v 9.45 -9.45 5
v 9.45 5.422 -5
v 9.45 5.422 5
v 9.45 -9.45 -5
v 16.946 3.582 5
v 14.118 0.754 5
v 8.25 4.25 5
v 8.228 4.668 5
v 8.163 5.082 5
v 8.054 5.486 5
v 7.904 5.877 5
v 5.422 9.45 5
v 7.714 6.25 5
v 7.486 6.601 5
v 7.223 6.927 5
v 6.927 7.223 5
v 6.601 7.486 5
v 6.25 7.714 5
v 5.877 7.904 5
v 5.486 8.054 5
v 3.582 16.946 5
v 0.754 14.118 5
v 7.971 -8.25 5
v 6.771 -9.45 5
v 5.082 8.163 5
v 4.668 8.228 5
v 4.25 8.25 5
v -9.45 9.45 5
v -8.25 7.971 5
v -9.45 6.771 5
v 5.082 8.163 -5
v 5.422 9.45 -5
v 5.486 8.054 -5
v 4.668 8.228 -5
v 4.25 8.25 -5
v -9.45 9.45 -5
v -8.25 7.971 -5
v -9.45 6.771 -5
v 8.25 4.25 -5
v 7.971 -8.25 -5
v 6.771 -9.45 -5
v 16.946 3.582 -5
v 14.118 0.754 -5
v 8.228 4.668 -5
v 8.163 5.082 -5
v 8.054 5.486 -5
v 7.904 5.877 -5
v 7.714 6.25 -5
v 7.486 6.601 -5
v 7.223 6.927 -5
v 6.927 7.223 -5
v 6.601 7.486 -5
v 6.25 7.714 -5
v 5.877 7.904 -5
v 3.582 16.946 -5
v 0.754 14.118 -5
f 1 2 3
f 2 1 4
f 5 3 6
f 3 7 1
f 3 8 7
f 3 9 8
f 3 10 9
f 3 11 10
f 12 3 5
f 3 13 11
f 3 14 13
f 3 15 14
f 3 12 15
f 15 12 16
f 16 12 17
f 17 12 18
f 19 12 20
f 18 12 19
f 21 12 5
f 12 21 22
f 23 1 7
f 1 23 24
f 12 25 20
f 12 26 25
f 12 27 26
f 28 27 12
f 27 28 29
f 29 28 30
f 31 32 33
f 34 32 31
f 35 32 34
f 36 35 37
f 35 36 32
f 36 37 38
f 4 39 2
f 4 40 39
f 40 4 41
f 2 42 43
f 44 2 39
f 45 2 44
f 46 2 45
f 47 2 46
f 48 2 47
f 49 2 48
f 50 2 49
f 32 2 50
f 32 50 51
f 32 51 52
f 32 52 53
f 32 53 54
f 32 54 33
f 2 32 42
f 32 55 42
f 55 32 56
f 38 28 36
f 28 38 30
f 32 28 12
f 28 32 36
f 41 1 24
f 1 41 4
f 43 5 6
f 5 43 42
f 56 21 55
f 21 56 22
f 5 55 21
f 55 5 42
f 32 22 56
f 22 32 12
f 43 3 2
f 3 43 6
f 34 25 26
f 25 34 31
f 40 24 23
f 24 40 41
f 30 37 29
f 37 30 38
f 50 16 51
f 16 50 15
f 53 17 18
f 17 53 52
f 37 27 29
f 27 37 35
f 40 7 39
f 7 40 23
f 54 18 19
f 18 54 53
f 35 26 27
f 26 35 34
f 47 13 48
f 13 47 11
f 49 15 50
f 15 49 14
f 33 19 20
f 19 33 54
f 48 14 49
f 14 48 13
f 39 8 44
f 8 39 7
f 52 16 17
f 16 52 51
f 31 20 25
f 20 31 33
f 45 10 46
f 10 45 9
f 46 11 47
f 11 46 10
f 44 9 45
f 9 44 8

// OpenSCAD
module rail_clip(h=10)
{
   wall=2.4;
   x=16.5;
   outerx=x+wall;

   difference(){
      union(){
         translate([outerx/2*-1,outerx/2*-1,h/2*-1]) 
           cube([outerx,outerx,h]);
         translate([x/2+wall/4,x/2+wall/4,0]) 
            rotate(-45)
            cube([outerx,4,h],center = true);
      }
 //     translate([outerx/2*-1,outerx/2*-1,h/2*-1]) 
 //        cube([x,x,h]);
      hull(){
         translate([x/2-wall,(x/2)*-1,0]) 
            rotate(-45)
            cube([3,3,h],center = true);
         translate([(x/2)*-1,x/2-wall,0]) 
            rotate(45)
            cube([3,3,h],center = true);
         translate([x/2-4,x/2-4,0]) 
            cylinder(r=4,h=x,center=true,$fn=60);
         translate([x/2*-1,x/2*-1,0]) 
            cylinder(r=4,h=x,center=true,$fn=60);
      }
   }
}

rail_clip();
